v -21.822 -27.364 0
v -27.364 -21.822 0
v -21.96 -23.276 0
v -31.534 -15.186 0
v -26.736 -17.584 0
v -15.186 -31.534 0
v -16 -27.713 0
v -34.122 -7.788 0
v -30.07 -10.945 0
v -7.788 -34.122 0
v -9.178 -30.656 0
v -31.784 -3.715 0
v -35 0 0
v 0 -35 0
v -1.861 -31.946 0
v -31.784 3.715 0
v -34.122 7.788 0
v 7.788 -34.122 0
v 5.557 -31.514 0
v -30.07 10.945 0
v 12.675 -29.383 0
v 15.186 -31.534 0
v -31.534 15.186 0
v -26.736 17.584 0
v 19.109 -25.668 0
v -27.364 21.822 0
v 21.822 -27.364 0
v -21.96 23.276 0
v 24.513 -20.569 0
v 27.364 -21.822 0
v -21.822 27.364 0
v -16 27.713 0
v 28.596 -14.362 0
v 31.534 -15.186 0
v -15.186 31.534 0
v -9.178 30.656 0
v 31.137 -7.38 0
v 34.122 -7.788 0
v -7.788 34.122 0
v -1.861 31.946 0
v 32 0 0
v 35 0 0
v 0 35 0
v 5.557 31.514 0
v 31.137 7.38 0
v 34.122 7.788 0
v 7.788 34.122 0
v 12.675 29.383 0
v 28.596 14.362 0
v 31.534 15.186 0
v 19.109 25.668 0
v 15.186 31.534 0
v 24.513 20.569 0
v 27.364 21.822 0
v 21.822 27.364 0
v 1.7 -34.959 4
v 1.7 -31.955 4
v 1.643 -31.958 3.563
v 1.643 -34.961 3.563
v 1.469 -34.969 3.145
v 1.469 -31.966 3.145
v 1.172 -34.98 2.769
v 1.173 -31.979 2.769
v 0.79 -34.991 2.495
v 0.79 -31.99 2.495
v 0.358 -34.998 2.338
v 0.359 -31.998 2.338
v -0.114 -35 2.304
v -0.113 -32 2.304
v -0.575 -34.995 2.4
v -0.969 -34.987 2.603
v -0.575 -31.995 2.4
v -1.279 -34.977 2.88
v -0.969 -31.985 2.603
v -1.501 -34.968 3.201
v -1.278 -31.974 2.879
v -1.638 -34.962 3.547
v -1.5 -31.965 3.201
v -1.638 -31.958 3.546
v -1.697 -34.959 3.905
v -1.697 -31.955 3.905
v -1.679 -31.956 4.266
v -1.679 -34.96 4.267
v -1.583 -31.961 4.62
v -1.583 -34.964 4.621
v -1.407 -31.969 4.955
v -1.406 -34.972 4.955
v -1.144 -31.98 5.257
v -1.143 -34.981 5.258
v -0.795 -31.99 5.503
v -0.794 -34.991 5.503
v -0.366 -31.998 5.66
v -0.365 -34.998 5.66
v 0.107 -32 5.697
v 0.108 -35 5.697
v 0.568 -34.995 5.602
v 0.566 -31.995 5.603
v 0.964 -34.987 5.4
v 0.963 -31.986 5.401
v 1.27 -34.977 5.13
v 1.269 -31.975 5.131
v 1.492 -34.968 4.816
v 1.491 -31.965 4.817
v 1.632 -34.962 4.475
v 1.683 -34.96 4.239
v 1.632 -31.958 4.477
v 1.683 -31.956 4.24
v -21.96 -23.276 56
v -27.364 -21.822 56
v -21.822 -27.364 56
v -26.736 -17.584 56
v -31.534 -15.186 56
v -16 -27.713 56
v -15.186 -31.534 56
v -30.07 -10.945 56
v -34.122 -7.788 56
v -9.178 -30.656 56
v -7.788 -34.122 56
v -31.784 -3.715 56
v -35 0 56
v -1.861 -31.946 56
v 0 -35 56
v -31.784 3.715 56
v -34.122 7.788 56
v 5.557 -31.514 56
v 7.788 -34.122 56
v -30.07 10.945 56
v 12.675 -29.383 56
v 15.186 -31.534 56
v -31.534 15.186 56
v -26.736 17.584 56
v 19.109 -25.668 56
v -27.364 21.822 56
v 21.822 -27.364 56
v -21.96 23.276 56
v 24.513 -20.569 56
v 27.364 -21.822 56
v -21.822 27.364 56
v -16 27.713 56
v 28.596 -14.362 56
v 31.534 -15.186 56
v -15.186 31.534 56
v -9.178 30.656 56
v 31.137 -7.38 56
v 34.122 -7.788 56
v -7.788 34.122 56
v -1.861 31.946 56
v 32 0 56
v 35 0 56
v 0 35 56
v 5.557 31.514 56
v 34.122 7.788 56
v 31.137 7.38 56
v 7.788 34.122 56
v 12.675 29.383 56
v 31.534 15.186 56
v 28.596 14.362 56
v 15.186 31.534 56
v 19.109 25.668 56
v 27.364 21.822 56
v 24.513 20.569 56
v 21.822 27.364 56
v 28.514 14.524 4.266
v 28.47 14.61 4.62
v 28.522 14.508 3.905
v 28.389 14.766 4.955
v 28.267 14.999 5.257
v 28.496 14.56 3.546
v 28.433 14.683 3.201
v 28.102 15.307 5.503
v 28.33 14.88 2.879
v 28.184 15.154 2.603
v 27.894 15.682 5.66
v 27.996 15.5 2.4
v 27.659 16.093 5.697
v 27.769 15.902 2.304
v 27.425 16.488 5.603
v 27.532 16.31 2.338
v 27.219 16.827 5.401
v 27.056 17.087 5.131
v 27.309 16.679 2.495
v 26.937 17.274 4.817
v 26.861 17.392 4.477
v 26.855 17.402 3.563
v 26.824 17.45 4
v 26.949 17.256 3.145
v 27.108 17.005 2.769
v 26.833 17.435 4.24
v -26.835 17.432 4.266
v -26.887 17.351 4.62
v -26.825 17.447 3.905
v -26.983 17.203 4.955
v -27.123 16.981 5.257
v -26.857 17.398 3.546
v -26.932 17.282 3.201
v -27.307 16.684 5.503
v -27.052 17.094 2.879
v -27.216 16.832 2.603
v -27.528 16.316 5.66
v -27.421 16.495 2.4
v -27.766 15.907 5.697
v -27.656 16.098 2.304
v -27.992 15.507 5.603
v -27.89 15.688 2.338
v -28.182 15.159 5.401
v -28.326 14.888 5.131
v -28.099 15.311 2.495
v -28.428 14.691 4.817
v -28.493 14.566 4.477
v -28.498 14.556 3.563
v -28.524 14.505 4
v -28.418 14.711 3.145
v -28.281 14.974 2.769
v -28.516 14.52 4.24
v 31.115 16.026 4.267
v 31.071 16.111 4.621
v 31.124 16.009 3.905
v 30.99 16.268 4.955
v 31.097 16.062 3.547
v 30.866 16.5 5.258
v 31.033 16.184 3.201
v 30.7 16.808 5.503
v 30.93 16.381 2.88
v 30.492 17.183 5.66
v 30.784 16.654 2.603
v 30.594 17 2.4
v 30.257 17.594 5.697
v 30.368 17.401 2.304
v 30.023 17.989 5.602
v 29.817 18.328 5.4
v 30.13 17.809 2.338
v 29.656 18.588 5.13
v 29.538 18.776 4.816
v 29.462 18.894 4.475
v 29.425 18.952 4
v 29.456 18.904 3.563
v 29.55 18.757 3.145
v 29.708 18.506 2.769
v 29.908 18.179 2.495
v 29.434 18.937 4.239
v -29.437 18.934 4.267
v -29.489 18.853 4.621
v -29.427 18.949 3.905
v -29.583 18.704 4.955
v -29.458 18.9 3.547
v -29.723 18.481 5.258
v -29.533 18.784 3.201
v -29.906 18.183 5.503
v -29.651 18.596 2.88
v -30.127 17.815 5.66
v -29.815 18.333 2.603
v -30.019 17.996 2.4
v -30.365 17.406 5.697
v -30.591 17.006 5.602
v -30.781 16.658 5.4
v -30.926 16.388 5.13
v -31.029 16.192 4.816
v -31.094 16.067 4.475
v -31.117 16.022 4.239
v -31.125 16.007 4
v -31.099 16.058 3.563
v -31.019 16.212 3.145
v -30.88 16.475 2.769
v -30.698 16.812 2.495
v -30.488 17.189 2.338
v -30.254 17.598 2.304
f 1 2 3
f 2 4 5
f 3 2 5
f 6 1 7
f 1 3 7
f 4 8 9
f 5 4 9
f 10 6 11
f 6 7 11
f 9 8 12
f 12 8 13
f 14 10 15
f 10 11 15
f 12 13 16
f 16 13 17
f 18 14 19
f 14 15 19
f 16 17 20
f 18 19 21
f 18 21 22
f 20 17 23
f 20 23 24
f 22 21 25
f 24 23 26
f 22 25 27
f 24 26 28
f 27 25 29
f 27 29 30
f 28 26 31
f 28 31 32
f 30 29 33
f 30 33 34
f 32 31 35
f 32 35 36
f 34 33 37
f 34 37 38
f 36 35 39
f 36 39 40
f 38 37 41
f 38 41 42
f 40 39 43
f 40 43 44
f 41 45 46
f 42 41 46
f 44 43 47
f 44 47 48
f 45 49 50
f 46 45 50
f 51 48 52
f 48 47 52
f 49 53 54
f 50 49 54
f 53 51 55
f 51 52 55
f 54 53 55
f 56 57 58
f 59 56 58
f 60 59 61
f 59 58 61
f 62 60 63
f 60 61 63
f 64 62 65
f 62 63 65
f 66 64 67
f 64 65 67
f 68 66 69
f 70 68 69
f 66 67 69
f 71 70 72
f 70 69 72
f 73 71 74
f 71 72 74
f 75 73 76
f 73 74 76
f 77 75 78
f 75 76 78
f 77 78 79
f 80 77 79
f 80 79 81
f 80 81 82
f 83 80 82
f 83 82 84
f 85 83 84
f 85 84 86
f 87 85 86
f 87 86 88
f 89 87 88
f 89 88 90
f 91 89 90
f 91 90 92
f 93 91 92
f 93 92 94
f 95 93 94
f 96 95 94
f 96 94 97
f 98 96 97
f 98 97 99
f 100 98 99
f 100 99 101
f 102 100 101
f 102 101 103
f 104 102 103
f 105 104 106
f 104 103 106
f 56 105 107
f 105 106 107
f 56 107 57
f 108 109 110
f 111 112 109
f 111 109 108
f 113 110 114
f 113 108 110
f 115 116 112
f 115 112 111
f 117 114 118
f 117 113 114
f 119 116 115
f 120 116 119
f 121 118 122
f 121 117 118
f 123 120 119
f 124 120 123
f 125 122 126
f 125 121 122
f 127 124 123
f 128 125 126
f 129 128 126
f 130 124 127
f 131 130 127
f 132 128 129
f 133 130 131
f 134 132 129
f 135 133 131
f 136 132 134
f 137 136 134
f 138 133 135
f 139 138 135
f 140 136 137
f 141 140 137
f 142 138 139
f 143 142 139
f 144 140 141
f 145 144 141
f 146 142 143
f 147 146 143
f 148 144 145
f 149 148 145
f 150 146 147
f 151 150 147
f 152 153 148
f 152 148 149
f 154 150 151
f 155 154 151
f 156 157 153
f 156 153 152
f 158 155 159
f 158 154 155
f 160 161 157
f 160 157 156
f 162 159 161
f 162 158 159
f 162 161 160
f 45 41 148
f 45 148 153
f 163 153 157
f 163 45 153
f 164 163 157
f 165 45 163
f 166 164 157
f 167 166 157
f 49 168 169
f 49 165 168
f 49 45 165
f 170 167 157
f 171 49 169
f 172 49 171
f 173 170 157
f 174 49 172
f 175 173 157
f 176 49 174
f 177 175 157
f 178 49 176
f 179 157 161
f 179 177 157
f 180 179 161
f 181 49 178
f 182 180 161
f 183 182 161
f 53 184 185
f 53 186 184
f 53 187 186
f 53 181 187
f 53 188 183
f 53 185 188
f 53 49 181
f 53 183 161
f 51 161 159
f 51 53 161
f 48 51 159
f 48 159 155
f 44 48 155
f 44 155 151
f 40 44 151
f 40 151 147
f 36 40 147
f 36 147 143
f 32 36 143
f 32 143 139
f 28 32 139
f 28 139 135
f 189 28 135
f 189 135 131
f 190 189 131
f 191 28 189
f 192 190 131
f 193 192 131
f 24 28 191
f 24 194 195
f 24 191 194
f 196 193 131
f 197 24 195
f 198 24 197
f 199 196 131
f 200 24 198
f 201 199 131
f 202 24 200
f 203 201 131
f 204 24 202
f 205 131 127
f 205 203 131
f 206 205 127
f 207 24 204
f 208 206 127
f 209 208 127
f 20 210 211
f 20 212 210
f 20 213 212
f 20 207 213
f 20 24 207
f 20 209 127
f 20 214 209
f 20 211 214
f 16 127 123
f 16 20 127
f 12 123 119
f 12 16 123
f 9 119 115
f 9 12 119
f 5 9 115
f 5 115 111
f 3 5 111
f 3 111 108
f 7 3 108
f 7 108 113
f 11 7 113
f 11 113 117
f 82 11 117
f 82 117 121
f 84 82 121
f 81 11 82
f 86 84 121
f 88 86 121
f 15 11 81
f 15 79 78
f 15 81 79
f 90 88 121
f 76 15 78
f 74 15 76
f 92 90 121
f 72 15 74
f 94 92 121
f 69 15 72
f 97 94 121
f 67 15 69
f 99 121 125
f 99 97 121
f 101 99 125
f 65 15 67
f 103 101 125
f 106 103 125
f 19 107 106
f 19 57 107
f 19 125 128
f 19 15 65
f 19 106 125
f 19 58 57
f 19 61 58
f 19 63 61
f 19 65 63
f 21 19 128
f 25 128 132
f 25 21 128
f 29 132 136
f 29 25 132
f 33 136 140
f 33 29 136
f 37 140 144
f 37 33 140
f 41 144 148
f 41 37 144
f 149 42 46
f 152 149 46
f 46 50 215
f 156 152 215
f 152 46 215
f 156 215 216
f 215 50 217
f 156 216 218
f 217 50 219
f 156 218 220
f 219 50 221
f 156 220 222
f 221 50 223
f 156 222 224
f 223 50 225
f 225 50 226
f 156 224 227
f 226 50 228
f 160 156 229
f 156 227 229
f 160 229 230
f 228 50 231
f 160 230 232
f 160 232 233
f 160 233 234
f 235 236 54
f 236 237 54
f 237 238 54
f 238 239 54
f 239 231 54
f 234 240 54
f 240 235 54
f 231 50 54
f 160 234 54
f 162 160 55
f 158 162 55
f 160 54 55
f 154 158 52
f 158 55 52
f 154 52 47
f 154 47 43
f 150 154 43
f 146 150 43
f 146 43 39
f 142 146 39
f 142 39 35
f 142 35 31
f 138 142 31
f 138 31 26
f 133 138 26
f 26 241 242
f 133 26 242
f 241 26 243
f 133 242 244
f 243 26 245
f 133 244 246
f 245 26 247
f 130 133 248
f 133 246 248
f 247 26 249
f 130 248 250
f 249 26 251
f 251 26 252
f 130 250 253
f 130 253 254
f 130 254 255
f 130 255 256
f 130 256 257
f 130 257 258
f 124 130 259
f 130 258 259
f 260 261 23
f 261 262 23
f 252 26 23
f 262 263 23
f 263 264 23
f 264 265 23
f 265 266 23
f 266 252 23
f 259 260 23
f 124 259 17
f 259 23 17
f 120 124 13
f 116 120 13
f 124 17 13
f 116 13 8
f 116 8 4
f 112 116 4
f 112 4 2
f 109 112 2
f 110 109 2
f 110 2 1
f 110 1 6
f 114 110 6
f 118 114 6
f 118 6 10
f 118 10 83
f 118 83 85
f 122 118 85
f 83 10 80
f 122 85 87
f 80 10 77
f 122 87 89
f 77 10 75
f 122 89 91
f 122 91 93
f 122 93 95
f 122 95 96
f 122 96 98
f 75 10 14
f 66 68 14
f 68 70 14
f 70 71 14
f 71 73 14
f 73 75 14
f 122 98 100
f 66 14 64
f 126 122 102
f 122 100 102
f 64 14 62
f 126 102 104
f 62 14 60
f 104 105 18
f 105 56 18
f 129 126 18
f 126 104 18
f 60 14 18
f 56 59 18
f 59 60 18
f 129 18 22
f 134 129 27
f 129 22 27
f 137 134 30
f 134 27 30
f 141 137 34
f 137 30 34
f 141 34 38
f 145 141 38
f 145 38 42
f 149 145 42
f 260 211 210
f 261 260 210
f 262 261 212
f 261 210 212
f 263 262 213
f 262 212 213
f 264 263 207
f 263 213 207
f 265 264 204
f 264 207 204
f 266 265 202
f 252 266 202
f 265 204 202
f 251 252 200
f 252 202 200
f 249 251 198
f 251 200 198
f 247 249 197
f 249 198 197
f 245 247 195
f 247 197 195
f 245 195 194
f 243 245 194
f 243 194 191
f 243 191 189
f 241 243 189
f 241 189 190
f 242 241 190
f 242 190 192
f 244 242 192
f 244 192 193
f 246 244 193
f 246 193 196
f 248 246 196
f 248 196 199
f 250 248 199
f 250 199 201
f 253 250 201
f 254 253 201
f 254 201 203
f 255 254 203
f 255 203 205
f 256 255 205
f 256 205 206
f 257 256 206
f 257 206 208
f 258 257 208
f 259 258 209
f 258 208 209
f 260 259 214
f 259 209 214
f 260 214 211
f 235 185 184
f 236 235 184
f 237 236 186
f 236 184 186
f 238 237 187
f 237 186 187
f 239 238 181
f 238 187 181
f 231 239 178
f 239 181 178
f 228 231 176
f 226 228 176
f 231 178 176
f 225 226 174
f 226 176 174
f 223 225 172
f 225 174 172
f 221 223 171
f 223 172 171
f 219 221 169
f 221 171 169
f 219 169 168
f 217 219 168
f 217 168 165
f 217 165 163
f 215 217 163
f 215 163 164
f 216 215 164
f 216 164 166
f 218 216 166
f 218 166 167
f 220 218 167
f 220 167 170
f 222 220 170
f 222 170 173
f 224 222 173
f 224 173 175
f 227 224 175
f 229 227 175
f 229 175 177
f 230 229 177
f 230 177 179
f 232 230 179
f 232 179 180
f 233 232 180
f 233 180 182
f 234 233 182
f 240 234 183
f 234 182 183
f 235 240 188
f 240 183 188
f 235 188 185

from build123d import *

# Parameters (mm, degrees)
ESQUISSE1_R                  = 35
ESQUISSE1_R_2                = 32
BASE_EXTRUSION_DEPTH         = 56
ESQUISSE2_R                  = 1.7
ENL_V_MAT_EXTRU_1_DEPTH      = 36
R_P_TITION_CIRCULAIRE1_COUNT = 3


with BuildPart() as part:
    # Esquisse1 → Base-Extrusion (new body)
    with BuildSketch(Plane.XY):
        Circle(ESQUISSE1_R)
        Circle(ESQUISSE1_R_2, mode=Mode.SUBTRACT)
    extrude(amount=BASE_EXTRUSION_DEPTH)

    # Esquisse2 → Enlèv. mat.-Extru.1 (cut, through all)
    with BuildSketch(Plane(origin=(0, 0, 0), x_dir=(1, 0, 0), z_dir=(0, 1, 0))):
        with Locations((0, -4)):
            Circle(ESQUISSE2_R)
    enl_v_mat_extru_1 = extrude(amount=-ENL_V_MAT_EXTRU_1_DEPTH, mode=Mode.SUBTRACT)

    # Répétition circulaire1: Enlèv. mat.-Extru.1 ×3 about axis
    r_p_tition_circulaire1_axis = Axis((0, 0, 0), (0, 0, -1))
    for i in range(1, R_P_TITION_CIRCULAIRE1_COUNT):
        add(enl_v_mat_extru_1.rotate(r_p_tition_circulaire1_axis, i * 360 / R_P_TITION_CIRCULAIRE1_COUNT), mode=Mode.SUBTRACT)


solid = part.part
